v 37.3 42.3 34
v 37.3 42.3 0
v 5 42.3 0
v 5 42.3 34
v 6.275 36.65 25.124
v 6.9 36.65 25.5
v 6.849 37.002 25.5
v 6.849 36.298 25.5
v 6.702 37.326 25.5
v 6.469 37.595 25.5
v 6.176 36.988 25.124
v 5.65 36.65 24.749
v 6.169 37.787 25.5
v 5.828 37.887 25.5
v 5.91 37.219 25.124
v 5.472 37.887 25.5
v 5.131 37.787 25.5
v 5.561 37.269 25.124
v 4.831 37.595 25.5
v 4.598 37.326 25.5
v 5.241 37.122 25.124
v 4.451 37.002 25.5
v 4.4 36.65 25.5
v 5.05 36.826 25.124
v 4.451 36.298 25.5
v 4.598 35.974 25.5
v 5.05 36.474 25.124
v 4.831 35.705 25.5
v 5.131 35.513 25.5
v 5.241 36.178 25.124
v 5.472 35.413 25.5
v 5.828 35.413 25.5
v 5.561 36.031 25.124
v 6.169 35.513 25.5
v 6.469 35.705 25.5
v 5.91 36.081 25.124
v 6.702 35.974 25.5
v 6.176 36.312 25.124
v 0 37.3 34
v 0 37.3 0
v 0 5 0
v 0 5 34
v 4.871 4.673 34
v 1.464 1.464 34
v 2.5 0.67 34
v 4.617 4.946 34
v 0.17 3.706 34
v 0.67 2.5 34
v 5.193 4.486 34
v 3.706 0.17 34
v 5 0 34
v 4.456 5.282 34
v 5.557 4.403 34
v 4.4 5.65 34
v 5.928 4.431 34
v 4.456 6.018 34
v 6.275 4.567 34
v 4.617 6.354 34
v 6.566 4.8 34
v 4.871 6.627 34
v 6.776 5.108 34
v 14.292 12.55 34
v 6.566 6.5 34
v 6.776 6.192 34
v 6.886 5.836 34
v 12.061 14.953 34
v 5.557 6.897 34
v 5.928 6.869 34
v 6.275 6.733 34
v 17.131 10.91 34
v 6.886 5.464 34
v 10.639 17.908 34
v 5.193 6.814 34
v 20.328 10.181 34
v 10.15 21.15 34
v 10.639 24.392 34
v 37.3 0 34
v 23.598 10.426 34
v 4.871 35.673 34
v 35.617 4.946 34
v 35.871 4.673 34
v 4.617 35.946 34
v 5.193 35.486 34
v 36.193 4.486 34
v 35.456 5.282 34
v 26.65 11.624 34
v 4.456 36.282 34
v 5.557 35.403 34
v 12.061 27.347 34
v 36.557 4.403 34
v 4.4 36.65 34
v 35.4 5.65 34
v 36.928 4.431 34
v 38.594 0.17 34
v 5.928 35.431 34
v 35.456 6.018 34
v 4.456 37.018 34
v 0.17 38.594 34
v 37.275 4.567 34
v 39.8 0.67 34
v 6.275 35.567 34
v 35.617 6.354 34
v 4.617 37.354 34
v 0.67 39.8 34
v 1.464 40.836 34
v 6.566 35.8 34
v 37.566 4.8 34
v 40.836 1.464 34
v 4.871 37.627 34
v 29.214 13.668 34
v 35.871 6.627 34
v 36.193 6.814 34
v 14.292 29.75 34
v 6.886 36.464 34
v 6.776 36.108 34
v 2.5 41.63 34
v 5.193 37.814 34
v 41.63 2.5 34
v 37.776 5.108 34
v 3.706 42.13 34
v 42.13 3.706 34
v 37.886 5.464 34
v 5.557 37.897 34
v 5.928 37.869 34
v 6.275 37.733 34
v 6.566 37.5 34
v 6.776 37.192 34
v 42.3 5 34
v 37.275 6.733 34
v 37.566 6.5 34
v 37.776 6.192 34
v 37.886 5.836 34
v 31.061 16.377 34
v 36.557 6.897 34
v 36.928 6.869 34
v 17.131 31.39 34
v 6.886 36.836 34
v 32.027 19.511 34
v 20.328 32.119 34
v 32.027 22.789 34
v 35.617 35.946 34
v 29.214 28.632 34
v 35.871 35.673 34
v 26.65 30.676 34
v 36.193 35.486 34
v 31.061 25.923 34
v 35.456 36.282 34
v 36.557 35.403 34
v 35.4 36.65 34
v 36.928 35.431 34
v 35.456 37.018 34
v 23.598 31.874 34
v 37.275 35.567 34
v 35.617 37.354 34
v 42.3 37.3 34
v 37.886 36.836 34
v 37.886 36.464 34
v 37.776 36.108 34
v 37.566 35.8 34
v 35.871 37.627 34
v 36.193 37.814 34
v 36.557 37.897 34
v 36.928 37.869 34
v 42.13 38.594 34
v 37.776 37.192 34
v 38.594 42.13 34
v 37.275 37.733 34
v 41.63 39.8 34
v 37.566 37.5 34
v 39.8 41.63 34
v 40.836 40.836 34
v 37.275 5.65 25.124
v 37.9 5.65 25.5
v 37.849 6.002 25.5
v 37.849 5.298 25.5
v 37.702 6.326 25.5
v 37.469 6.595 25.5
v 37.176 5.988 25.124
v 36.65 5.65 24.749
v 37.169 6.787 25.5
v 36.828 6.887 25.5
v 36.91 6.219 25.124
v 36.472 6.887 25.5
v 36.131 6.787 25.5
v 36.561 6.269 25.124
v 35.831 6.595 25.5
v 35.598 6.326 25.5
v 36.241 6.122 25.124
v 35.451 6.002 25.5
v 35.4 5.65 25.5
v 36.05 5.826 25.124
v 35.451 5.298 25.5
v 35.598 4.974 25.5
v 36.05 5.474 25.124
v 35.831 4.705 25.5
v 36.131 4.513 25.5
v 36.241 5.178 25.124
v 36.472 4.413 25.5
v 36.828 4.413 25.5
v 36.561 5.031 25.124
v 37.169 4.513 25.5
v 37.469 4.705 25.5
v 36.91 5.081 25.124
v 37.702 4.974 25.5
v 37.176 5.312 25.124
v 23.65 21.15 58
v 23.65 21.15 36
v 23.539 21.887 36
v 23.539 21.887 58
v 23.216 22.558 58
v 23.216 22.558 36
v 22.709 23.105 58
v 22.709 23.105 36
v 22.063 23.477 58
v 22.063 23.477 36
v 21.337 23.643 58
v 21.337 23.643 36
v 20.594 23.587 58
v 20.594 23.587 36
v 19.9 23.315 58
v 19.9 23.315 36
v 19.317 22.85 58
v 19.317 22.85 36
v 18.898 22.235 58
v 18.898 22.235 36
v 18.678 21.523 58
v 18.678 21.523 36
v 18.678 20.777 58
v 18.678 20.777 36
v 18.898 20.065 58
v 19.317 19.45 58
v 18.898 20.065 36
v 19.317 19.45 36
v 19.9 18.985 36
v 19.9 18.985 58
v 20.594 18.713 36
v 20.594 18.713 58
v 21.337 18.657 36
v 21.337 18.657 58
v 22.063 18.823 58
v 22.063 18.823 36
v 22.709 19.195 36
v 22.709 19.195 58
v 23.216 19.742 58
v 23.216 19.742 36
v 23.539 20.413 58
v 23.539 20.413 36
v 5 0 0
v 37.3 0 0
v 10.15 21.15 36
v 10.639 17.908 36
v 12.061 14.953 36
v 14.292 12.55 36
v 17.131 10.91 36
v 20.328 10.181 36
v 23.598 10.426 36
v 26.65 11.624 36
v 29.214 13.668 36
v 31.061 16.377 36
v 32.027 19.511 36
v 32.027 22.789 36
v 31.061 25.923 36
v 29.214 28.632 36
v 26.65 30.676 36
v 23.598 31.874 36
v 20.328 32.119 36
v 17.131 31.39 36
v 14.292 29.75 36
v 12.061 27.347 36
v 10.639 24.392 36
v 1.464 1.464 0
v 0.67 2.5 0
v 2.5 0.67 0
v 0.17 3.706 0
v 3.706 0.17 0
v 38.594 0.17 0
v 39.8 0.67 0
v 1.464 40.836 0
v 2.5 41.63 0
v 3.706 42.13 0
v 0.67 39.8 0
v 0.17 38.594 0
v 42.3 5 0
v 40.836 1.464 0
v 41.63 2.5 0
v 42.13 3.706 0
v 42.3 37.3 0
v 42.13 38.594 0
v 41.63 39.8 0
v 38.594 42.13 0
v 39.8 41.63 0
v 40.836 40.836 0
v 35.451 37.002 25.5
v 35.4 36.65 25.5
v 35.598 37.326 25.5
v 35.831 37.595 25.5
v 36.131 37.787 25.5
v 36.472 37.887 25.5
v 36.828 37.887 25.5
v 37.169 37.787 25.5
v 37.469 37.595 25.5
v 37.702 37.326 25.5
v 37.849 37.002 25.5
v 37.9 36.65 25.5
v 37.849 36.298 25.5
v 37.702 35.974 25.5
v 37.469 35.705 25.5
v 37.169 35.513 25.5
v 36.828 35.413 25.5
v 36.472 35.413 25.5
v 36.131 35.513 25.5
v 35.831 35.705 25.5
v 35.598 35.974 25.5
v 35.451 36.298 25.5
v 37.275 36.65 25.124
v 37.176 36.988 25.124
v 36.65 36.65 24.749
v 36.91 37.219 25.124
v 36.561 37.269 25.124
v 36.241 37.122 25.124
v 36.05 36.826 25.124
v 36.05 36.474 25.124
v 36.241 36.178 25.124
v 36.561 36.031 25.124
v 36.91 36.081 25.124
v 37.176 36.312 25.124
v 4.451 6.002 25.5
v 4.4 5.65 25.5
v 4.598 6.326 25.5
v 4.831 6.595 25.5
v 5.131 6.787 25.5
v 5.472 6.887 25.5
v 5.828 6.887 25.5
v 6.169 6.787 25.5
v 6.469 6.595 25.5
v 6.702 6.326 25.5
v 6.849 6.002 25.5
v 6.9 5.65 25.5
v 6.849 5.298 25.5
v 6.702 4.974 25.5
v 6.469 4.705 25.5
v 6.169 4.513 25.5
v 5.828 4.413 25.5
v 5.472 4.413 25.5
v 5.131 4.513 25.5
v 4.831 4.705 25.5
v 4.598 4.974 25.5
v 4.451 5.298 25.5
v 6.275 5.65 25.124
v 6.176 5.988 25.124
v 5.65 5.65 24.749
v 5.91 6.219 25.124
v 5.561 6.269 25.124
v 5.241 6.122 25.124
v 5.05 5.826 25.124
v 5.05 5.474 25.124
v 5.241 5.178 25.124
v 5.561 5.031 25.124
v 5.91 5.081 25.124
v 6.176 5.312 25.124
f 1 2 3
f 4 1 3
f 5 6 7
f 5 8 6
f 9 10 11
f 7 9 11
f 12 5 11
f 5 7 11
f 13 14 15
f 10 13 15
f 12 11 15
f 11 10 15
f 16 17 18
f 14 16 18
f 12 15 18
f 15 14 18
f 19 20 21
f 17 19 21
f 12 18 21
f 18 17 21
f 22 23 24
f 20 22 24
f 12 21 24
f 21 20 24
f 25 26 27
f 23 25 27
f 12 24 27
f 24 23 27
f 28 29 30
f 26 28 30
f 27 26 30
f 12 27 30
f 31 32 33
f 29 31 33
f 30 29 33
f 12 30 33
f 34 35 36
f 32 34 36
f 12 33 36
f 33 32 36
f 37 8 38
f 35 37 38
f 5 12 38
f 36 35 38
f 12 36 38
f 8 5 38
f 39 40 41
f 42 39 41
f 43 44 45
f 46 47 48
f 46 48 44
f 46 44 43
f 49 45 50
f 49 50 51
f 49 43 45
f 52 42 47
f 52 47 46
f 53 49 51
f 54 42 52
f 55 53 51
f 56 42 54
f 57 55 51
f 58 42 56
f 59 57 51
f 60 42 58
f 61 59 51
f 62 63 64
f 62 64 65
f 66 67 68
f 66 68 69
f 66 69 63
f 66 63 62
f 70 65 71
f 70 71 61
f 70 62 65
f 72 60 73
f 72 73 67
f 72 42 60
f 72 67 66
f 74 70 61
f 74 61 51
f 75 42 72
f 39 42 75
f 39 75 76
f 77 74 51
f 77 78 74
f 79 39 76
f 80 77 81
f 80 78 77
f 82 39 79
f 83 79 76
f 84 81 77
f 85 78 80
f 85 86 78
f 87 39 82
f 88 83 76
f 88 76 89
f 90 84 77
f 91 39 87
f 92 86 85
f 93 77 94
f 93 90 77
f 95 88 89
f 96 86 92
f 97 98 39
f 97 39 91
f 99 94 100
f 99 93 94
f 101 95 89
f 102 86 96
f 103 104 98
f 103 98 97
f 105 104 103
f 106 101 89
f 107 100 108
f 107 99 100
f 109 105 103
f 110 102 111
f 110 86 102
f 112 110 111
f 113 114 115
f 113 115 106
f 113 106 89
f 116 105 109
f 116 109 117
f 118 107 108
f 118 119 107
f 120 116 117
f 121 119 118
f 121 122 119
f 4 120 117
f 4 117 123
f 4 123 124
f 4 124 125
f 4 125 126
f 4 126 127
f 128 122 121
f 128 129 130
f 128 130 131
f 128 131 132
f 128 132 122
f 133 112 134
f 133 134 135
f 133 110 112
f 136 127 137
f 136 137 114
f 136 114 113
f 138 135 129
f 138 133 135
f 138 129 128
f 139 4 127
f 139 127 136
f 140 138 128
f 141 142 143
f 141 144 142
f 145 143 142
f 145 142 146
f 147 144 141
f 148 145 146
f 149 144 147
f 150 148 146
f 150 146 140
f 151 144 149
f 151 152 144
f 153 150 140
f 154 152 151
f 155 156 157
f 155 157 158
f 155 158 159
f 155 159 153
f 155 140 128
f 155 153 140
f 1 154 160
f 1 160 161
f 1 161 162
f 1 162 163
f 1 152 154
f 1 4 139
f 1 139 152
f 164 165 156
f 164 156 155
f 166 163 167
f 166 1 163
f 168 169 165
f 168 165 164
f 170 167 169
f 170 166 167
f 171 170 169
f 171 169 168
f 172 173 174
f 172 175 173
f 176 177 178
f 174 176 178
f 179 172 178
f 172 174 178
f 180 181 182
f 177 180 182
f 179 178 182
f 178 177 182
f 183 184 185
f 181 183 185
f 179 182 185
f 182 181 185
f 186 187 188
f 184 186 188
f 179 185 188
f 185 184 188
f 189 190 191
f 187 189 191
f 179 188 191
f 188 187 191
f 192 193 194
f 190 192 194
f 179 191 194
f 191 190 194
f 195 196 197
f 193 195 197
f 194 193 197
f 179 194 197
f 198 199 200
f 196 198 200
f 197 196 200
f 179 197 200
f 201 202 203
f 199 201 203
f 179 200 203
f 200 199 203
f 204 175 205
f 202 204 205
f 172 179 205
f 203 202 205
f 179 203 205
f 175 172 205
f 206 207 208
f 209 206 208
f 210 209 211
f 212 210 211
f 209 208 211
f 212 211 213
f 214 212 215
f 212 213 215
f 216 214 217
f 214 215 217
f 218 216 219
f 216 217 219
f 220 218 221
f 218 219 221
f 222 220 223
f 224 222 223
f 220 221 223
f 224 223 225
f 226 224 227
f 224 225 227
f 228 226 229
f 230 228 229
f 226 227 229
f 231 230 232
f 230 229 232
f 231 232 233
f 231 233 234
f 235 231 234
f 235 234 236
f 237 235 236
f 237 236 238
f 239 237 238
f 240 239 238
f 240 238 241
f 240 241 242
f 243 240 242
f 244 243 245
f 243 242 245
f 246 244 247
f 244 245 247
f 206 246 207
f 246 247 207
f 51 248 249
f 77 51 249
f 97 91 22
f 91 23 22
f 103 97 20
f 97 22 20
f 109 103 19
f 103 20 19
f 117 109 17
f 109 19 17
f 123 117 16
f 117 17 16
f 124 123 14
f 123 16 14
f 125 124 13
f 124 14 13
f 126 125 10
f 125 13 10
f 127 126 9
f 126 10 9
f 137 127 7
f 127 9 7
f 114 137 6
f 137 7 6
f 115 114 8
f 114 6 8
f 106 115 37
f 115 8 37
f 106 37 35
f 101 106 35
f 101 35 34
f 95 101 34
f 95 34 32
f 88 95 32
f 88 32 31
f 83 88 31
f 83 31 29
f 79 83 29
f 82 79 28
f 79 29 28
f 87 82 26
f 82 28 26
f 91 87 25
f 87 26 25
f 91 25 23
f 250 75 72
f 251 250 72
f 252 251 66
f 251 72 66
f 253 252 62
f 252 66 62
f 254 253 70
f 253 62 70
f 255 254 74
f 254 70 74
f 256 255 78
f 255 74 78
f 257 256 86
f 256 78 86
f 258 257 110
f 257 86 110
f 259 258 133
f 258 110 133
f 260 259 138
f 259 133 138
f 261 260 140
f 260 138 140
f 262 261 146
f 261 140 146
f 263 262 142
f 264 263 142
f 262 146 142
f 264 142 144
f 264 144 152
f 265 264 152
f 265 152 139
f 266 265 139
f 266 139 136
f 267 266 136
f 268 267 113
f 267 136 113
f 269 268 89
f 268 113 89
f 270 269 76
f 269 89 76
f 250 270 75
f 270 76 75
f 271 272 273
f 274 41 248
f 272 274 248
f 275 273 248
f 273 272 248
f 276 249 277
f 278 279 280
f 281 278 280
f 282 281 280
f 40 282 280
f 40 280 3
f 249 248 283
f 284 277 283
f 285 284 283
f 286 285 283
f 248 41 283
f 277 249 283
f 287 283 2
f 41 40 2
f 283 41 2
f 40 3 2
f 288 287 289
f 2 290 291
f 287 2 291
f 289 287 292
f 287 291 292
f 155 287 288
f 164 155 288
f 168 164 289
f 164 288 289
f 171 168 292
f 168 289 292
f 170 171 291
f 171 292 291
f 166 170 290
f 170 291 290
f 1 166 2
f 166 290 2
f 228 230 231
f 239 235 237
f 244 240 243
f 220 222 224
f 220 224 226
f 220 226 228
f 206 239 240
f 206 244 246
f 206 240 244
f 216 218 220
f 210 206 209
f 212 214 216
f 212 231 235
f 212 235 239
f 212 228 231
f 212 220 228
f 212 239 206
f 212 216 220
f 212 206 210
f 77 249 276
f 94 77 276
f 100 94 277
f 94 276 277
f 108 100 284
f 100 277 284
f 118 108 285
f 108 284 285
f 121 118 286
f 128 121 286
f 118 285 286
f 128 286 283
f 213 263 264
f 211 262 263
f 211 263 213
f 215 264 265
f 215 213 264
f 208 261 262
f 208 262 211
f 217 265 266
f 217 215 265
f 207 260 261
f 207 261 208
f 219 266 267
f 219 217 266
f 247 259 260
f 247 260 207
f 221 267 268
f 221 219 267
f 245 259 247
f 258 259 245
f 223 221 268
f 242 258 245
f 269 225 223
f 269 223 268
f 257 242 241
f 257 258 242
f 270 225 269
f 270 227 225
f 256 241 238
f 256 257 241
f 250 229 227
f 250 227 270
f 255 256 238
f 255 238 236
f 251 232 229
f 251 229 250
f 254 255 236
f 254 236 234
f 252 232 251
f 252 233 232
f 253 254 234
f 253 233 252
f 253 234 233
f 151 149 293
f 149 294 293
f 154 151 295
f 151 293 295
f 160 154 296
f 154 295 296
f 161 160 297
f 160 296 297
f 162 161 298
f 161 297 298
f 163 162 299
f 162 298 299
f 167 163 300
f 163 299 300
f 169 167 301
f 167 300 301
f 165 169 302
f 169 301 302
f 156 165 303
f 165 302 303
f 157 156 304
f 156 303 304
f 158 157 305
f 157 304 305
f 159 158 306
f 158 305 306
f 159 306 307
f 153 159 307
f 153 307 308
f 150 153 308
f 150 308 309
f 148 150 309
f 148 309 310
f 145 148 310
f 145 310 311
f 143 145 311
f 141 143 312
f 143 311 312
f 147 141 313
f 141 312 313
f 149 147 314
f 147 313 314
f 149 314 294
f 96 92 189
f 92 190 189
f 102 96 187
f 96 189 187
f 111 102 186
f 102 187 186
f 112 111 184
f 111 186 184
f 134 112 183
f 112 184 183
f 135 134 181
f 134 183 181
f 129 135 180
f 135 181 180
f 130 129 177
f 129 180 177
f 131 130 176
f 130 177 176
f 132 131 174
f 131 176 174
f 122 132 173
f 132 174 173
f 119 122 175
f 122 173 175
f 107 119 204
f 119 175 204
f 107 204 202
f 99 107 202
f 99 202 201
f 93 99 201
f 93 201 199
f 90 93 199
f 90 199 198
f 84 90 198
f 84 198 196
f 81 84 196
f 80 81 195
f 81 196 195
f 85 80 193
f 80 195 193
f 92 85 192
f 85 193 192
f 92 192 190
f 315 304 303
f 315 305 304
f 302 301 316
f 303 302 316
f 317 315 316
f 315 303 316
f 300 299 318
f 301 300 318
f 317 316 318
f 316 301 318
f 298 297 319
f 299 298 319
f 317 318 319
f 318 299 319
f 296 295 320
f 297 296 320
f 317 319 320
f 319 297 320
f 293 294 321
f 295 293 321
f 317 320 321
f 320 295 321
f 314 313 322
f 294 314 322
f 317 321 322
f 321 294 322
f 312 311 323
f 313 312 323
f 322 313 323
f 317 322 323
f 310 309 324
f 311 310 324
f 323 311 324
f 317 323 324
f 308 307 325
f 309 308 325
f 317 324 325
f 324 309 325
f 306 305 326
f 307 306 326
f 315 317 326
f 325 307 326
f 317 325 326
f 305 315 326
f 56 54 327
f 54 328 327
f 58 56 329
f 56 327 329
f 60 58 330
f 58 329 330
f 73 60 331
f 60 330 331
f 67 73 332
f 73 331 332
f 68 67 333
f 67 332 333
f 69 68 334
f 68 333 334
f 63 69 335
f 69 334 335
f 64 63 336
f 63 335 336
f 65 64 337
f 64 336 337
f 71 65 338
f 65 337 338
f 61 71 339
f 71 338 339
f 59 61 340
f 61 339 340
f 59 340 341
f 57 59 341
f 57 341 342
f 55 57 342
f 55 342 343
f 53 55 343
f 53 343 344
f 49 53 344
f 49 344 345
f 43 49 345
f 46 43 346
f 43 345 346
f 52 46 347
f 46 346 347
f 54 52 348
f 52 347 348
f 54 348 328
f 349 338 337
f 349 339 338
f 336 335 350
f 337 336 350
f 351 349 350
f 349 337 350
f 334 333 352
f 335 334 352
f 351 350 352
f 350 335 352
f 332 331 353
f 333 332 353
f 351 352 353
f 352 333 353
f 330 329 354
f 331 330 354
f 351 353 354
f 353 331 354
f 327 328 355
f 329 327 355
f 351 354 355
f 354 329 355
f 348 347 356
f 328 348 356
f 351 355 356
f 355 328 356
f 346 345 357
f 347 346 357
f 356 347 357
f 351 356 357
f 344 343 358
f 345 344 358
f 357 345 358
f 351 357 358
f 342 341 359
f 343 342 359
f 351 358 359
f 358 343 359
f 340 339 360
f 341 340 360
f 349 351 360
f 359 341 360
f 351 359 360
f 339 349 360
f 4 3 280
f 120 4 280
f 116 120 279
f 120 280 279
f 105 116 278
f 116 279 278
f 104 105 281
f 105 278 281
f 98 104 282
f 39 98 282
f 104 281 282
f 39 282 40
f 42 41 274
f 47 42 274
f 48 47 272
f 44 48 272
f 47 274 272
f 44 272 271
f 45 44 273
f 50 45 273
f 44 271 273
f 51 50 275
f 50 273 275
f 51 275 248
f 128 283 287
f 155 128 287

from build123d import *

# Parameters (mm, degrees)
AUFSATZ_LINEAR_AUSTRAGEN1_DEPTH = 34
SKIZZE2_R                       = 11
AUFSATZ_LINEAR_AUSTRAGEN2_DEPTH = 2
SKIZZE3_R                       = 2.5
AUFSATZ_LINEAR_AUSTRAGEN3_DEPTH = 22
M3_GEWINDEBOHRUNG1_D            = 2.5
M3_GEWINDEBOHRUNG1_DEPTH        = 8.5
M3_GEWINDEBOHRUNG1_TIP          = 0.751075774


with BuildPart() as part:
    # Skizze1 → Aufsatz-Linear austragen1 (new body)
    with BuildSketch(Plane.XY):
        with BuildLine():
            Line((5, 0), (37.3, 0))
            ThreePointArc((37.3, 0), (40.835533906, 1.464466094), (42.3, 5))
            Line((42.3, 5), (42.3, 37.3))
            ThreePointArc((42.3, 37.3), (40.835533906, 40.835533906), (37.3, 42.3))
            Line((37.3, 42.3), (5, 42.3))
            ThreePointArc((5, 42.3), (1.464466094, 40.835533906), (0, 37.3))
            Line((0, 37.3), (0, 5))
            ThreePointArc((0, 5), (1.464466094, 1.464466094), (5, 0))
        make_face()
    extrude(amount=AUFSATZ_LINEAR_AUSTRAGEN1_DEPTH)

    # Skizze2 → Aufsatz-Linear austragen2 (add)
    with BuildSketch(Plane.XY.offset(34)):
        with Locations(Location((21.15, 21.15, 0), (0, 0, 180))):
            Circle(SKIZZE2_R)
    extrude(amount=AUFSATZ_LINEAR_AUSTRAGEN2_DEPTH)

    # Skizze3 → Aufsatz-Linear austragen3 (add)
    with BuildSketch(Plane.XY.offset(36)):
        with Locations((21.15, 21.15)):
            Circle(SKIZZE3_R)
    extrude(amount=AUFSATZ_LINEAR_AUSTRAGEN3_DEPTH)

    # M3 Gewindebohrung1
    with Locations(Plane(origin=(5.65, 36.65, 34), x_dir=(1, 0, 0), z_dir=(0, 0, 1))):
        with Locations((0, 0), (31, 0), (31, -31), (0, -31)):
            Hole(M3_GEWINDEBOHRUNG1_D / 2, depth=M3_GEWINDEBOHRUNG1_DEPTH)
            with Locations((0, 0, -(M3_GEWINDEBOHRUNG1_DEPTH + M3_GEWINDEBOHRUNG1_TIP / 2))):  # 118° drill point
                Cone(0, M3_GEWINDEBOHRUNG1_D / 2, M3_GEWINDEBOHRUNG1_TIP, mode=Mode.SUBTRACT)


solid = part.part
